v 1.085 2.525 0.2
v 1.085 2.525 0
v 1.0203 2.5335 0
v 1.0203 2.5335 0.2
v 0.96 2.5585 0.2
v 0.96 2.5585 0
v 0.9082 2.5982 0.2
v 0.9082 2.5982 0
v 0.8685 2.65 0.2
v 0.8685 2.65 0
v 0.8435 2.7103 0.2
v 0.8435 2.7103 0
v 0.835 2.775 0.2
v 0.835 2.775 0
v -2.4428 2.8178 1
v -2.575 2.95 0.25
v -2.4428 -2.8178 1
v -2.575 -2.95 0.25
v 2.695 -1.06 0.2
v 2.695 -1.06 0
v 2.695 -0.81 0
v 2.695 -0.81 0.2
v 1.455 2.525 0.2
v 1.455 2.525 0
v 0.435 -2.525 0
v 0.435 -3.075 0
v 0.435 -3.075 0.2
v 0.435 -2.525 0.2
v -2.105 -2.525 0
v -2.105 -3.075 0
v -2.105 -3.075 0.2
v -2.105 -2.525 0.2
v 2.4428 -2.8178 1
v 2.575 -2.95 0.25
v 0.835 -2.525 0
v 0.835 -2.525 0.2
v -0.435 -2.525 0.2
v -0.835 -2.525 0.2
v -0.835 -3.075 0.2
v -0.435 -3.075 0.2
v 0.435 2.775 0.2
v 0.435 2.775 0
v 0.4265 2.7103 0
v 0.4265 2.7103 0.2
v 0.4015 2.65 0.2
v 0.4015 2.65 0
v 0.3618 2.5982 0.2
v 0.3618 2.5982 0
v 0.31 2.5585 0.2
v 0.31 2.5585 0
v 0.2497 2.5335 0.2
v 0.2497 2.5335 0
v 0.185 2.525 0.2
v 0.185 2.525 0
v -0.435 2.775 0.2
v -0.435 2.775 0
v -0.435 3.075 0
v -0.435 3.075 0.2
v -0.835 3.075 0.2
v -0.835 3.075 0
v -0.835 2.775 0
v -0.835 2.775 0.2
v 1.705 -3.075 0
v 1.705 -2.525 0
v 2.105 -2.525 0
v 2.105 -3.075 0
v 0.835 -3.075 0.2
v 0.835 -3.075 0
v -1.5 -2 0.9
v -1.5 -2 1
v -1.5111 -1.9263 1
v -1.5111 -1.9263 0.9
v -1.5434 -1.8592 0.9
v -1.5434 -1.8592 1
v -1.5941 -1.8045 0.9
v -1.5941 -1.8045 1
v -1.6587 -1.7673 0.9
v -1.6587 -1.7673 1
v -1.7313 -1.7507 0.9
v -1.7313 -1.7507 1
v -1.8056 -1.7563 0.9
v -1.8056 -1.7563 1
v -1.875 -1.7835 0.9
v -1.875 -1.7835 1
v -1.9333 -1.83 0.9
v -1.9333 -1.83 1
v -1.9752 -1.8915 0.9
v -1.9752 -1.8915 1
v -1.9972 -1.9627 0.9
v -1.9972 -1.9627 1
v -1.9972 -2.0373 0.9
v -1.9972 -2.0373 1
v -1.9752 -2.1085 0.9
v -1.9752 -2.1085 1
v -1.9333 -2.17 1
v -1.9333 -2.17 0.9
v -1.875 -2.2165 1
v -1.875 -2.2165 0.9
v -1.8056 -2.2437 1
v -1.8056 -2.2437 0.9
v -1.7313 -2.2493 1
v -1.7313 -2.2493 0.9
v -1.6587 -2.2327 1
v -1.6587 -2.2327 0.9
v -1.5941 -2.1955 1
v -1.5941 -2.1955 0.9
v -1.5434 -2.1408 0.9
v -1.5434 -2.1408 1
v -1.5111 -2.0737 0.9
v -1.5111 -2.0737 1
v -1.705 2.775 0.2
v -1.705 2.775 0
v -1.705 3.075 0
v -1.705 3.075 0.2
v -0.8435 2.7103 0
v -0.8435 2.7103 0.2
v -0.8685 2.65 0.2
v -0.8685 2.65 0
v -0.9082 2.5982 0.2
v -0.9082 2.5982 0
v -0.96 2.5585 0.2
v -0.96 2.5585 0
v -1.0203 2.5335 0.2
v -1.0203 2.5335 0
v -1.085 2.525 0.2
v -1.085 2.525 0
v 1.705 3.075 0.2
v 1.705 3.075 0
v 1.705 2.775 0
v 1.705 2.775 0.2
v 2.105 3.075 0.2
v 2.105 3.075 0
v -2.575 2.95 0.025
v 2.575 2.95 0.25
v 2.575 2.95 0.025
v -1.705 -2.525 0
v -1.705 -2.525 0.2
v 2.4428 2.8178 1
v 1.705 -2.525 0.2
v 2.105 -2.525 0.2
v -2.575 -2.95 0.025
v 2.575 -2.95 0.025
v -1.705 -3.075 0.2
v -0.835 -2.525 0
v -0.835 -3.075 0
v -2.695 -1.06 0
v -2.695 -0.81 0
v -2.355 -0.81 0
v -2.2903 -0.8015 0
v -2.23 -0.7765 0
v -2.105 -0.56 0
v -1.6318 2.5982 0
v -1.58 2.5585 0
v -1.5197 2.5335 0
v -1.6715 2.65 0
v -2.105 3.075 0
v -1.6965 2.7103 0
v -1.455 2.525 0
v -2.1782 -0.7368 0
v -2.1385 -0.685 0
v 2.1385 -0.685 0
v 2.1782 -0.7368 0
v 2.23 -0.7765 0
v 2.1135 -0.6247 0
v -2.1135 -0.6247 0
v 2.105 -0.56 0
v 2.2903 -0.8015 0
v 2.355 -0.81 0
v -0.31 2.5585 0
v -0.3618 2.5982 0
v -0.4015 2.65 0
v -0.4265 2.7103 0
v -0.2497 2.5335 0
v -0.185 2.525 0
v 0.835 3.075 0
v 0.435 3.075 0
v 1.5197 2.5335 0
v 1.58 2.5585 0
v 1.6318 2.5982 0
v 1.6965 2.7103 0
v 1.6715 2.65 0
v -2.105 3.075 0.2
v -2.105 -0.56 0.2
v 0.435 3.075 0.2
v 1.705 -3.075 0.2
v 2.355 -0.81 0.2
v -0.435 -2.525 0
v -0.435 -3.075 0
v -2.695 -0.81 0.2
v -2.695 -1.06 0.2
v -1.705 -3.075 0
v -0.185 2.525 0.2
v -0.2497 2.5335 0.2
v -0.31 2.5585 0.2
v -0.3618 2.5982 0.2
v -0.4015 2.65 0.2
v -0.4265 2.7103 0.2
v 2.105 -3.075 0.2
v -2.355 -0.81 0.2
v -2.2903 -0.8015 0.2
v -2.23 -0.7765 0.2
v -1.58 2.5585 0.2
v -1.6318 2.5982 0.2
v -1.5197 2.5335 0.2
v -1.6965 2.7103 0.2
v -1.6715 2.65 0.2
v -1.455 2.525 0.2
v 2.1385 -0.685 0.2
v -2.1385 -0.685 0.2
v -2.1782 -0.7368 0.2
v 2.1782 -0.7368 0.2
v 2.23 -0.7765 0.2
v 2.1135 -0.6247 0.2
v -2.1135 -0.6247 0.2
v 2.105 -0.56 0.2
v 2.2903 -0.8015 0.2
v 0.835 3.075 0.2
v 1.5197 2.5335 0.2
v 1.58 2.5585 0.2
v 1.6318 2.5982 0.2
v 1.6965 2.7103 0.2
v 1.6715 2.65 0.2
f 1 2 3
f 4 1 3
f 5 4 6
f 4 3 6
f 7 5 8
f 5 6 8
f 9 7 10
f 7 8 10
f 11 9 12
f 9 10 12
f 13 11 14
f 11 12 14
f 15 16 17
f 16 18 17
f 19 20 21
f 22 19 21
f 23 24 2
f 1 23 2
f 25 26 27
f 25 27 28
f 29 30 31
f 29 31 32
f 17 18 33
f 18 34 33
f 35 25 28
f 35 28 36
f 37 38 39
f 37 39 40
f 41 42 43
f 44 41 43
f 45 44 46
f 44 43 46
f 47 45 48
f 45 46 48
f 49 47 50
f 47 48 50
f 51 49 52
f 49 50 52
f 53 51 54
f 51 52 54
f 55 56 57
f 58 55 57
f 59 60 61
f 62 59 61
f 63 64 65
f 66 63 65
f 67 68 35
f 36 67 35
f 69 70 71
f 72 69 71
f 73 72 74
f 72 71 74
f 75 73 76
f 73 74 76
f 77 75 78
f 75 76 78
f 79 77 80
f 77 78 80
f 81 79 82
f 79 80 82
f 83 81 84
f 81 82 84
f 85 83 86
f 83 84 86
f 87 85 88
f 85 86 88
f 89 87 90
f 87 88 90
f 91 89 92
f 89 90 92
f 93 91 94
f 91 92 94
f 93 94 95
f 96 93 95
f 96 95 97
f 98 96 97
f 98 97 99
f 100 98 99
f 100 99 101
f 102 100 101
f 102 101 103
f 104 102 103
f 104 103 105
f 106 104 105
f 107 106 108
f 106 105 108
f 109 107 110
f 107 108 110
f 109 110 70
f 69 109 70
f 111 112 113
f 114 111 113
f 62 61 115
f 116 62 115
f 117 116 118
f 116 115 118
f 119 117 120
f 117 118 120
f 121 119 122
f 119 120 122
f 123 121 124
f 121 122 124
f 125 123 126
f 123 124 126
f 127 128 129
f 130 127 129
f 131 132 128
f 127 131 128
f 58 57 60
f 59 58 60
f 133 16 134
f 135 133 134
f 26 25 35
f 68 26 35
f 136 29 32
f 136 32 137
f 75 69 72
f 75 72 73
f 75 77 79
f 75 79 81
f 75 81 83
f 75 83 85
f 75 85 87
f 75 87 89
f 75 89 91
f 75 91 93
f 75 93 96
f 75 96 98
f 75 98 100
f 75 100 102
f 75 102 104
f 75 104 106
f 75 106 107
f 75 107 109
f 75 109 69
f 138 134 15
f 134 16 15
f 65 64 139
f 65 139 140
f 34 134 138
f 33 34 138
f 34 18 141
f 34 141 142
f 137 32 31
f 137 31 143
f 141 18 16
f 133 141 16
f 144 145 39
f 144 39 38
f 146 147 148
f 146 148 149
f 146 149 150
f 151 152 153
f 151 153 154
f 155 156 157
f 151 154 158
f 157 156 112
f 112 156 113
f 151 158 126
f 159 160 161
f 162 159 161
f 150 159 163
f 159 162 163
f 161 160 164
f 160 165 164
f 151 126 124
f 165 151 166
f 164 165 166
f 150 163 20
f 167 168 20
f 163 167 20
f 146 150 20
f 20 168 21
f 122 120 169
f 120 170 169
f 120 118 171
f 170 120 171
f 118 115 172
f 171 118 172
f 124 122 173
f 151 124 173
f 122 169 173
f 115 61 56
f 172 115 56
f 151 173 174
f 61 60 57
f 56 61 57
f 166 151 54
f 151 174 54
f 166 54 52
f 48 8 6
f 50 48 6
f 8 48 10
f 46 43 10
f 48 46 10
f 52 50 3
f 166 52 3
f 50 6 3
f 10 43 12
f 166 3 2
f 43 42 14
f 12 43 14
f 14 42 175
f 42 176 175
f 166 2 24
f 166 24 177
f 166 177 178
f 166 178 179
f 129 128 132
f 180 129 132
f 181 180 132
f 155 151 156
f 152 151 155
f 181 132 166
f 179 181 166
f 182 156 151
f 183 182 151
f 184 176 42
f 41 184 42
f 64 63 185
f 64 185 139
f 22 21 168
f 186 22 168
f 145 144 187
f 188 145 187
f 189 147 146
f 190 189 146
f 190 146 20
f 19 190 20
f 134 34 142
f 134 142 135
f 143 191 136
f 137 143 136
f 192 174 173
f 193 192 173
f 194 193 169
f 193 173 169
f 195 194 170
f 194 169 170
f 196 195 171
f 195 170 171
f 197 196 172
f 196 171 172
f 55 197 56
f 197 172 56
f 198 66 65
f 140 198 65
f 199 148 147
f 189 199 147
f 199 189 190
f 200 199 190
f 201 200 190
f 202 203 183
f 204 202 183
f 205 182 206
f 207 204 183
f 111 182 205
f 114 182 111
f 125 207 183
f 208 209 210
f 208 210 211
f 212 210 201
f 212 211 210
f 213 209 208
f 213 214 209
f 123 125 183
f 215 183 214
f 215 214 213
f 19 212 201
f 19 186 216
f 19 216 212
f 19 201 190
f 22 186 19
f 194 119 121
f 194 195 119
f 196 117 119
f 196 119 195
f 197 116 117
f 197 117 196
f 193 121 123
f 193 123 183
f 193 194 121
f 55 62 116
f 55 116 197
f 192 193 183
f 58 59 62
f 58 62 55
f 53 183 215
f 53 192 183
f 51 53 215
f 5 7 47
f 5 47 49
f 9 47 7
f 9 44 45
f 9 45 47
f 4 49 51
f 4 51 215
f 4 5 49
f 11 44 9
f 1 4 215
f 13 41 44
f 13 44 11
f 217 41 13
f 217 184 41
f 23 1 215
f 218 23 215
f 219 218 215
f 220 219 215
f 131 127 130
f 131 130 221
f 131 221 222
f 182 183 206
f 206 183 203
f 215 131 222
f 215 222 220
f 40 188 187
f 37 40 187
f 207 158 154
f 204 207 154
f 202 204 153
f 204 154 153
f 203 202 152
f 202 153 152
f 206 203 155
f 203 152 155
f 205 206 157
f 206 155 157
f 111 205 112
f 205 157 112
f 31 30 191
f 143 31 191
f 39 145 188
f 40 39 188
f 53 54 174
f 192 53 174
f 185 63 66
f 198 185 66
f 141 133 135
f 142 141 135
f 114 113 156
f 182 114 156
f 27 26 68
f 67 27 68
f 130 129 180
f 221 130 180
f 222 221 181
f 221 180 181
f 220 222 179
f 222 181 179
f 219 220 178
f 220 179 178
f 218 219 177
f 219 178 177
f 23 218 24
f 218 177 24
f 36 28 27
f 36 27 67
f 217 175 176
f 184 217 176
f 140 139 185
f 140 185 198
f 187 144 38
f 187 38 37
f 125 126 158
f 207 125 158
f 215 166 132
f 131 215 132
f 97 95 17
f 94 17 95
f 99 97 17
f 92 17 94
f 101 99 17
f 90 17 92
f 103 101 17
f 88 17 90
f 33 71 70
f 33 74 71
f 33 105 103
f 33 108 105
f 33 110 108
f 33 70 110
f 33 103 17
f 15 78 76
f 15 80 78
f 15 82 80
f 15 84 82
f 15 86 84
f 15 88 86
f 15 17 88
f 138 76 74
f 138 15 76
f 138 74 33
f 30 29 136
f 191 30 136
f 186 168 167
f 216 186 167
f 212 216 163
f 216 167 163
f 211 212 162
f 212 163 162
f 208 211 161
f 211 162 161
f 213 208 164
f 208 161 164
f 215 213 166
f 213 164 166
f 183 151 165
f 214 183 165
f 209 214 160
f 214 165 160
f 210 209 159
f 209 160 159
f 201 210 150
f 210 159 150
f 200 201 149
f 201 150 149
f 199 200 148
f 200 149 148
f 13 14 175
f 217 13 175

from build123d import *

# Parameters (mm, degrees)
PIN_EXTRUDE_DEPTH    = 0.2
ESBO_O1_W            = 0.4
ESBO_O1_H            = 0.55
PIN_EXTRUDE_2_DEPTH  = 0.2
PIN_EXTRUDE_3_DEPTH  = 0.2
PIN_EXTRUDE_4_DEPTH  = 0.2
PIN_EXTRUDE_5_DEPTH  = 0.2
BODY_START           = 0.25
ESBO_O3_W            = 5.15
ESBO_O3_H            = 5.9
BODY_DEPTH           = 0.75
BODY_TAPER           = 10
BODY_OTHER_WAY_DEPTH = 0.225
SKETCH_1_R           = 0.25
CUT_EXTRUDE_1_DEPTH  = 0.1


with BuildPart() as part:
    # Esboço1 → Pin Extrude (new body)
    with BuildSketch(Plane.XY):
        with BuildLine():
            Line((-0.435, 3.075), (-0.835, 3.075))
            Line((-0.835, 3.075), (-0.835, 2.775))
            ThreePointArc((-0.835, 2.775), (-0.908223305, 2.598223305), (-1.085, 2.525))
            Line((-1.085, 2.525), (-1.455, 2.525))
            ThreePointArc((-1.455, 2.525), (-1.631776695, 2.598223305), (-1.705, 2.775))
            Line((-1.705, 2.775), (-1.705, 3.075))
            Line((-1.705, 3.075), (-2.105, 3.075))
            Line((-2.105, 3.075), (-2.105, -0.56))
            ThreePointArc((-2.105, -0.56), (-2.178223305, -0.736776695), (-2.355, -0.81))
            Line((-2.355, -0.81), (-2.695, -0.81))
            Line((-2.695, -0.81), (-2.695, -1.06))
            Line((-2.695, -1.06), (2.695, -1.06))
            Line((2.695, -1.06), (2.695, -0.81))
            Line((2.695, -0.81), (2.355, -0.81))
            ThreePointArc((2.355, -0.81), (2.178223305, -0.736776695), (2.105, -0.56))
            Line((2.105, -0.56), (2.105, 3.075))
            Line((2.105, 3.075), (1.705, 3.075))
            Line((1.705, 3.075), (1.705, 2.775))
            ThreePointArc((1.705, 2.775), (1.631776695, 2.598223305), (1.455, 2.525))
            Line((1.455, 2.525), (1.085, 2.525))
            ThreePointArc((1.085, 2.525), (0.908223305, 2.598223305), (0.835, 2.775))
            Line((0.835, 2.775), (0.835, 3.075))
            Line((0.835, 3.075), (0.435, 3.075))
            Line((0.435, 3.075), (0.435, 2.775))
            ThreePointArc((0.435, 2.775), (0.361776695, 2.598223305), (0.185, 2.525))
            Line((0.185, 2.525), (-0.185, 2.525))
            ThreePointArc((-0.185, 2.525), (-0.361776695, 2.598223305), (-0.435, 2.775))
            Line((-0.435, 2.775), (-0.435, 3.075))
        make_face()
    extrude(amount=PIN_EXTRUDE_DEPTH)


with BuildPart() as body_2:
    # Esboço1 → Pin Extrude 2 (new body)
    with BuildSketch(Plane.XY):
        with Locations((0.635, -2.8)):
            Rectangle(ESBO_O1_W, ESBO_O1_H)
    extrude(amount=PIN_EXTRUDE_2_DEPTH)


with BuildPart() as body_3:
    # Esboço1 → Pin Extrude 3 (new body)
    with BuildSketch(Plane.XY):
        with Locations((1.905, -2.8)):
            Rectangle(ESBO_O1_W, ESBO_O1_H)
    extrude(amount=PIN_EXTRUDE_3_DEPTH)


with BuildPart() as body_4:
    # Esboço1 → Pin Extrude 4 (new body)
    with BuildSketch(Plane.XY):
        with Locations((-1.905, -2.8)):
            Rectangle(ESBO_O1_W, ESBO_O1_H)
    extrude(amount=PIN_EXTRUDE_4_DEPTH)


with BuildPart() as body_5:
    # Esboço1 → Pin Extrude 5 (new body)
    with BuildSketch(Plane.XY):
        with Locations((-0.635, -2.8)):
            Rectangle(ESBO_O1_W, ESBO_O1_H)
    extrude(amount=PIN_EXTRUDE_5_DEPTH)


with BuildPart() as body_6:
    # Esboço3 → Body (new body)
    with BuildSketch(Plane.XY.offset(BODY_START)):
        Rectangle(ESBO_O3_W, ESBO_O3_H)
    extrude(amount=BODY_DEPTH, taper=BODY_TAPER)

    # Esboço3 → Body other way (add)
    with BuildSketch(Plane.XY.offset(BODY_START)):
        Rectangle(ESBO_O3_W, ESBO_O3_H)
    extrude(amount=-BODY_OTHER_WAY_DEPTH)

    # Эскиз1 → Вырез-Вытянуть1 (cut)
    with BuildSketch(Plane.XY.offset(1)):
        with Locations((-1.75, -2)):
            Circle(SKETCH_1_R)
    extrude(amount=-CUT_EXTRUDE_1_DEPTH, mode=Mode.SUBTRACT)


solid = Compound([part.part, body_2.part, body_3.part, body_4.part, body_5.part, body_6.part])
